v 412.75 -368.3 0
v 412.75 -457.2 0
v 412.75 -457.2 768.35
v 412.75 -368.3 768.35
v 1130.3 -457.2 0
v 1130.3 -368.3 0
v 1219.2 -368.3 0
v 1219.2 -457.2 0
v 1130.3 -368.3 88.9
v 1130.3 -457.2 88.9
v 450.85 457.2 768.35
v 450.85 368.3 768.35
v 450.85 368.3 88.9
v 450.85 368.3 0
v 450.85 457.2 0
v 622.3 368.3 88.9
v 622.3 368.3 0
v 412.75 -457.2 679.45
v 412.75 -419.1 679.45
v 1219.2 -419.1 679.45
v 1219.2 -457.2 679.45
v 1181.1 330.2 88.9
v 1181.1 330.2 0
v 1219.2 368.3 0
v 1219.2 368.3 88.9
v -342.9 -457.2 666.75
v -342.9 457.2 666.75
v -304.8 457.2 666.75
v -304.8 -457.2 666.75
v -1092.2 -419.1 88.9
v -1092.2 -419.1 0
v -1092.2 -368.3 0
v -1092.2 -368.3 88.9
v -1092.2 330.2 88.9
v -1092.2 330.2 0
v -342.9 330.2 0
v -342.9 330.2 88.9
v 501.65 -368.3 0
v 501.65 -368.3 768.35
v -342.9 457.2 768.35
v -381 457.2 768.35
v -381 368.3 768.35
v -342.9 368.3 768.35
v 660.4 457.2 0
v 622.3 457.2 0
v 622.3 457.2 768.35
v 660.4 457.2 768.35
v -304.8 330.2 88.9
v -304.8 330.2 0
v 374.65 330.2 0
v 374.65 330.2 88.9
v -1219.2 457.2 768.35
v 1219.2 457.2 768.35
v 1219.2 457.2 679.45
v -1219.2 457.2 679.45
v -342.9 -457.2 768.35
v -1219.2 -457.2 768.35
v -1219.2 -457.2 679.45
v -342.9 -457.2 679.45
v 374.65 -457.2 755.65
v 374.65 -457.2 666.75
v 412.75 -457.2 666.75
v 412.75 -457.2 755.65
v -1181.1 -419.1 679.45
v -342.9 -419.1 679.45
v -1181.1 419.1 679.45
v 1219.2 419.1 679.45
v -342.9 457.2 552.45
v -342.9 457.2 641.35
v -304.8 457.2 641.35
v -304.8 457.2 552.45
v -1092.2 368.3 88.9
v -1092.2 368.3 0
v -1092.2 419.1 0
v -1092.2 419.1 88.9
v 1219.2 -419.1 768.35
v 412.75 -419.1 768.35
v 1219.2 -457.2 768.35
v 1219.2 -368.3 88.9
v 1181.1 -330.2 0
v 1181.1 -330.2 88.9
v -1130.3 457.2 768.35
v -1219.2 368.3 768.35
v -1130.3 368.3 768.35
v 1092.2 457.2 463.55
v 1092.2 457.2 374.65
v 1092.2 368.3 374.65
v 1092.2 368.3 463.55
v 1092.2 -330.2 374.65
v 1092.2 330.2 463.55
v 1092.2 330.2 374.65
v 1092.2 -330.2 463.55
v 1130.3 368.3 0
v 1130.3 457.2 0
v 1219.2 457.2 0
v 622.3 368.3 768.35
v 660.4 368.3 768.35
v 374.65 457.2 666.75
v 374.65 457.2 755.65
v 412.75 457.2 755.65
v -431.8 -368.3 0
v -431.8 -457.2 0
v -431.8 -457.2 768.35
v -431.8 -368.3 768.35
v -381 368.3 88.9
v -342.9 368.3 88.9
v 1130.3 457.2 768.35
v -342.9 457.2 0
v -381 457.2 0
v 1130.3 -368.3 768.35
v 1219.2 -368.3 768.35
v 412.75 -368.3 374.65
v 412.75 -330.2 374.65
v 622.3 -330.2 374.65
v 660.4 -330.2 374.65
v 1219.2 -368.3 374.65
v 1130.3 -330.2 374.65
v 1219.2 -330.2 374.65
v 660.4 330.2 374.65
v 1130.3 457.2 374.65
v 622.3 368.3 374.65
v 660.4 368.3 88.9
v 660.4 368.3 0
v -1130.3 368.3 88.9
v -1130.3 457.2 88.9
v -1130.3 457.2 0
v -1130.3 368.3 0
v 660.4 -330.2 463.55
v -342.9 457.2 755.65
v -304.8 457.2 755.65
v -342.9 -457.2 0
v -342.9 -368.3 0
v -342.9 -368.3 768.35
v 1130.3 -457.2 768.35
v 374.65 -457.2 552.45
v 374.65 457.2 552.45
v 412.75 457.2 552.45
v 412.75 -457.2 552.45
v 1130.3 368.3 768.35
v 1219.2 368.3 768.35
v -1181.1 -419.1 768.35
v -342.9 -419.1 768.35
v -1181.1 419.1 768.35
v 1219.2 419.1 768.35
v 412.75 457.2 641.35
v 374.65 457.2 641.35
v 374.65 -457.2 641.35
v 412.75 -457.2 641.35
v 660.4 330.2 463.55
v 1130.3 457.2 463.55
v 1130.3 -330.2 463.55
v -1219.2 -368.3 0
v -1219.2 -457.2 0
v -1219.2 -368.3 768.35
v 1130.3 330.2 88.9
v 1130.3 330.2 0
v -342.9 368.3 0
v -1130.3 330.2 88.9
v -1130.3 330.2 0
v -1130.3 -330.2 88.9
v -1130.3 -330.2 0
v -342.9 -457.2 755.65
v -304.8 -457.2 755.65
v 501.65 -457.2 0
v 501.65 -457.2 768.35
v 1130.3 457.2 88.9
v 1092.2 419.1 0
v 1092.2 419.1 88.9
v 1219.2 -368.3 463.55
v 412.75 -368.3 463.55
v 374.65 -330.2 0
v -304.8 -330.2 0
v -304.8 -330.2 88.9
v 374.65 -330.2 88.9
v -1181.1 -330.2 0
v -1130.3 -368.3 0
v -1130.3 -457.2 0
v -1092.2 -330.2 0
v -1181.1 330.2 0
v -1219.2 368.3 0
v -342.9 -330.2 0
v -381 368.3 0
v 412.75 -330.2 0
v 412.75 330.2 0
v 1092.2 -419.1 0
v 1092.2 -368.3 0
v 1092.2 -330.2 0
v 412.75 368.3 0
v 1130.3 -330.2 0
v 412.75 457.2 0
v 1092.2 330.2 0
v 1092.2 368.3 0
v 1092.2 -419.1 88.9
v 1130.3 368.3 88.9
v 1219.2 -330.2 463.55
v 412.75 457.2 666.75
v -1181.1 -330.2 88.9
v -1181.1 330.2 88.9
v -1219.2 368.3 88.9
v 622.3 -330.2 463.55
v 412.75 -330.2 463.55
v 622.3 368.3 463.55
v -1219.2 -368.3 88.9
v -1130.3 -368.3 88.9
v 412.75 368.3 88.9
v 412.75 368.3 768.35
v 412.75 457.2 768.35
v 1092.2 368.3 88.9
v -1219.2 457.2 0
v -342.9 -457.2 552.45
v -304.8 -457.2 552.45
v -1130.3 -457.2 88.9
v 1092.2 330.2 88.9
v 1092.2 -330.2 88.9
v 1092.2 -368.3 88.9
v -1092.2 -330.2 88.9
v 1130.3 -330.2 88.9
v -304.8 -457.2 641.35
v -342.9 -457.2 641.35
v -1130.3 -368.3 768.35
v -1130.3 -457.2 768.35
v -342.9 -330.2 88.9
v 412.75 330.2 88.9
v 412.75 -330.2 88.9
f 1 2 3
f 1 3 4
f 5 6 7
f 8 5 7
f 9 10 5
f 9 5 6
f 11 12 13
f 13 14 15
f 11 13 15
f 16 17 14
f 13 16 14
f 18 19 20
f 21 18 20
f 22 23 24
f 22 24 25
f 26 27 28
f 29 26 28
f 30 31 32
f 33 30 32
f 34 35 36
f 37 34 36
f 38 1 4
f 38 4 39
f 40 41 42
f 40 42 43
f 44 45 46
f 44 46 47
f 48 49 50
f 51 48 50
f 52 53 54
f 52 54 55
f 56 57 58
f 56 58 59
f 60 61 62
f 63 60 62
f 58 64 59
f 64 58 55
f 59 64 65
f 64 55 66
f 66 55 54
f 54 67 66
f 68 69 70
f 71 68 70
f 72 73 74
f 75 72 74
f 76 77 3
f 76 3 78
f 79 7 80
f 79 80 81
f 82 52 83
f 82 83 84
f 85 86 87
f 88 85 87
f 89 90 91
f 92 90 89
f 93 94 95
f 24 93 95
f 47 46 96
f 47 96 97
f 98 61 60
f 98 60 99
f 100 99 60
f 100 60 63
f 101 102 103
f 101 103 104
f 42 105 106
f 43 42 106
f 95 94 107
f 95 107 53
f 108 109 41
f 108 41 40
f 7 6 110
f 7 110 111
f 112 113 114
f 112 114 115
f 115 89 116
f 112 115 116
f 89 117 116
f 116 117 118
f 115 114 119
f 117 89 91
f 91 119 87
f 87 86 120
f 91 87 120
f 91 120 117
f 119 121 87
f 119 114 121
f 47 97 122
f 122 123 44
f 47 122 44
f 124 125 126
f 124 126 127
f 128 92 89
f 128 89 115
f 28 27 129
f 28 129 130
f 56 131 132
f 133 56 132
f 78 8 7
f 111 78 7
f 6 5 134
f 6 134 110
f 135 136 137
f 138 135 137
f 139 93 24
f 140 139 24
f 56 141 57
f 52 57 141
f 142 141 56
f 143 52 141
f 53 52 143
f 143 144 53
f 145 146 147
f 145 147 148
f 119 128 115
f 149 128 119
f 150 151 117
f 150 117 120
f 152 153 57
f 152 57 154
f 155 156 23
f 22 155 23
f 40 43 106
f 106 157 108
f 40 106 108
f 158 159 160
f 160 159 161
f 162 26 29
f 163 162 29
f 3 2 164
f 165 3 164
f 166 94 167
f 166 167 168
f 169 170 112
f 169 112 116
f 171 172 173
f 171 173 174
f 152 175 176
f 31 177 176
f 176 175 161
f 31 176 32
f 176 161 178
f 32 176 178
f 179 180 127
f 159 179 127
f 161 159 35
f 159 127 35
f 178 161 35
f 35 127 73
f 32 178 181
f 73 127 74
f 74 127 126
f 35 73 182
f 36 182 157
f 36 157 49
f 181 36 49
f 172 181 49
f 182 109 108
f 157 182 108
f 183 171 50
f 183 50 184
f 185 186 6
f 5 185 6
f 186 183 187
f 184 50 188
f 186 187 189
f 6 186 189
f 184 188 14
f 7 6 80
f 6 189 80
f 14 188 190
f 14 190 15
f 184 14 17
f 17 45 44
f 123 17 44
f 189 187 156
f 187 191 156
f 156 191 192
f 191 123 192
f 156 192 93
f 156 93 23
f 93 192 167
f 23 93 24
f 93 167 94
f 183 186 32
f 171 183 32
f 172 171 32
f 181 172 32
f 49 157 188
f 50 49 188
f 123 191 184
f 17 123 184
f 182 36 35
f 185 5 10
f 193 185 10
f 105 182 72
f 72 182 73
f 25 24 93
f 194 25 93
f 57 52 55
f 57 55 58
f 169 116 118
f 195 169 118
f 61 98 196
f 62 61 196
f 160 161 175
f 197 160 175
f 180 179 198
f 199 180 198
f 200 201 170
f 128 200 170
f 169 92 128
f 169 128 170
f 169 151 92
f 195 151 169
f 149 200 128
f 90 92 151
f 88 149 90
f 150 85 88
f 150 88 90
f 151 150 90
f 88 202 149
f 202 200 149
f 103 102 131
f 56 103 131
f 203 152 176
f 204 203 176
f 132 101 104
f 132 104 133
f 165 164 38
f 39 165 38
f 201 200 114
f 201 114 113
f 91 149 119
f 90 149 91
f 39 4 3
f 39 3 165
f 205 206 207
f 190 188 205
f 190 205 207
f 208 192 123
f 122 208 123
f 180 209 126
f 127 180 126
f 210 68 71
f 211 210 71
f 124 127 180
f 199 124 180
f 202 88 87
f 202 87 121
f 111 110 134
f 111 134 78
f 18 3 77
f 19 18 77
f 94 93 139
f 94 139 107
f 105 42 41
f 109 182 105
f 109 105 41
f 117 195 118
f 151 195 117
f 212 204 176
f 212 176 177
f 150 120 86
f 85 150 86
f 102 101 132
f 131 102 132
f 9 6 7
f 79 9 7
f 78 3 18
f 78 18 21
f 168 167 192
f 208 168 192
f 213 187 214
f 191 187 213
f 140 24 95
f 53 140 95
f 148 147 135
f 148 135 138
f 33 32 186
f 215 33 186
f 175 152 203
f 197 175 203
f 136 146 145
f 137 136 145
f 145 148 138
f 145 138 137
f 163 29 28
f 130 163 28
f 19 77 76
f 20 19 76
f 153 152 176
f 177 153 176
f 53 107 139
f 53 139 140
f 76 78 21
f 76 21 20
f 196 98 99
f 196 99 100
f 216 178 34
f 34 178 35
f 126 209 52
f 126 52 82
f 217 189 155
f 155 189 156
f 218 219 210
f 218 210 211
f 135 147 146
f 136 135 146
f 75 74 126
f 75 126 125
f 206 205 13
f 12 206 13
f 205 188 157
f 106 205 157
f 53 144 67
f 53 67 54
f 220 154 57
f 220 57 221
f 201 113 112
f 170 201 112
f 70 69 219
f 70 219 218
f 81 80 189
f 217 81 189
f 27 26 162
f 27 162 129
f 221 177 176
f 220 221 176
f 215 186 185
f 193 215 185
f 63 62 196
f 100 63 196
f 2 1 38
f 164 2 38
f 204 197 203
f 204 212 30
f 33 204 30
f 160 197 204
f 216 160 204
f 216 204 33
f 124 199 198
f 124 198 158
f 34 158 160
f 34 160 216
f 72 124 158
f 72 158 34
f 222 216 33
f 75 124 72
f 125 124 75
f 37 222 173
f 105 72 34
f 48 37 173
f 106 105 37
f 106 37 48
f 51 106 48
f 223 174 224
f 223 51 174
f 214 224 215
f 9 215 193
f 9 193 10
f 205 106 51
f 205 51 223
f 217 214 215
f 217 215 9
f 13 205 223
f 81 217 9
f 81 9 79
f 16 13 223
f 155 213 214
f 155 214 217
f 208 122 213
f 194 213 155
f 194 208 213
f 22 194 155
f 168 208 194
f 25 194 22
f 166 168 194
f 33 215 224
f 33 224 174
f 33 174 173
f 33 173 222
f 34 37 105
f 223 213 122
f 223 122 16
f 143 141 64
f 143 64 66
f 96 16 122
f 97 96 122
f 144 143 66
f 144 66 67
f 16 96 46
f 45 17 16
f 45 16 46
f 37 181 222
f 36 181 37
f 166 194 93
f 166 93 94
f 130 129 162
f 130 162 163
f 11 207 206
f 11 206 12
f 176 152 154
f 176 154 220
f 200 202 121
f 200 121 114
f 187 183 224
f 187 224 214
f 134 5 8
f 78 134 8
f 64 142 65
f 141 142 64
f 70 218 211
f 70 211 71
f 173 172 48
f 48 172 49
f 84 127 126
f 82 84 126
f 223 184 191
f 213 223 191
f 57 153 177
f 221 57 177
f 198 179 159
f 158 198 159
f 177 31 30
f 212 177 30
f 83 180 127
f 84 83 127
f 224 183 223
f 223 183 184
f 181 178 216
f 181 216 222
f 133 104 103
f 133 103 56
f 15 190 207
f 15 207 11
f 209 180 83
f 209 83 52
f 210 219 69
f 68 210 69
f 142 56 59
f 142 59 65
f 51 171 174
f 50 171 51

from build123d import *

# Parameters (mm, degrees)
F0_W      = 88.9
F0_H      = 88.9
F1_DEPTH  = 768.35
F2_W      = 2184.4
F2_H      = 660.4
F3_DEPTH  = 88.9
F4_SIZE   = 38.09999
F5_W      = 38.1
F5_H      = 660.4
F6_DEPTH  = 88.9
F7_W      = 38.1
F7_H      = 88.9
F8_DEPTH  = 768.35
F13_W     = 38.1
F13_H     = 660.4
F14_DEPTH = 88.9
F15_W     = 38.1
F15_H     = 914.4
F16_DEPTH = 88.9
F17_W     = 38.1
F17_H     = 914.4
F18_DEPTH = 88.9
F19_DEPTH = 88.9
F12_W     = 806.45
F12_H     = 38.1


# Not quite as in the source:
# - a fillet or chamfer is up to 0.001 mm smaller than in the source, because OpenCascade refuses the exact size


with BuildPart() as f1:
    # F0 (on Top) → F1 (new body)
    with BuildSketch(Plane.XY):
        with Locations((-1174.75, -412.75)):
            Rectangle(F0_W, F0_H)
    extrude(amount=F1_DEPTH)


with BuildPart() as f1b:
    # F0 (on Top) → F1, piece 2 (new body)
    with BuildSketch(Plane.XY):
        with Locations((-1174.75, 412.75)):
            Rectangle(F0_W, F0_H)
    extrude(amount=F1_DEPTH)


with BuildPart() as f1c:
    # F0 (on Top) → F1, piece 3 (new body)
    with BuildSketch(Plane.XY):
        with Locations((1174.75, -412.75)):
            Rectangle(F0_W, F0_H)
    extrude(amount=F1_DEPTH)


with BuildPart() as f1d:
    # F0 (on Top) → F1, piece 4 (new body)
    with BuildSketch(Plane.XY):
        with Locations((1174.75, 412.75)):
            Rectangle(F0_W, F0_H)
    extrude(amount=F1_DEPTH)


with BuildPart() as f1e:
    # F0 (on Top) → F1, piece 5 (new body)
    with BuildSketch(Plane.XY):
        with Locations((-387.35, -412.75)):
            Rectangle(F0_W, F0_H)
    extrude(amount=F1_DEPTH)


with BuildPart() as f1f:
    # F0 (on Top) → F1, piece 6 (new body)
    with BuildSketch(Plane.XY):
        with Locations((457.2, -412.75)):
            Rectangle(F0_W, F0_H)
    extrude(amount=F1_DEPTH)


with BuildPart() as f3:
    # F2 (on Top) → F3 (new body)
    with BuildSketch(Plane.XY):
        Polygon((-1130.3, 368.3), (-1219.2, 368.3), (-1219.2, 330.2), (-1130.3, 330.2), (-1130.3, -330.2), (-1219.2, -330.2), (-1219.2, -368.3), (-1130.3, -368.3), (-1130.3, -457.2), (-1092.2, -457.2), (-1092.2, -368.3), (1092.2, -368.3), (1092.2, -457.2), (1130.3, -457.2), (1130.3, -368.3), (1219.2, -368.3), (1219.2, -330.2), (1130.3, -330.2), (1130.3, 330.2), (1219.2, 330.2), (1219.2, 368.3), (1130.3, 368.3), (1130.3, 457.2), (1092.2, 457.2), (1092.2, 368.3), (-1092.2, 368.3), (-1092.2, 457.2), (-1130.3, 457.2), align=None)
        Rectangle(F2_W, F2_H, mode=Mode.SUBTRACT)
    extrude(amount=F3_DEPTH)

    # F4 (size 38.1 in the source; OpenCascade refuses exactly that, so slightly less here)
    f4_edges = [f3.edges().sort_by_distance(p)[0] for p in [
        (-1219.2, 330.2, 44.45),
        (-1219.2, -330.2, 44.45),
        (-1092.2, -457.2, 44.45),
        (1092.2, -457.2, 44.45),
        (1219.2, 330.2, 44.45),
        (1092.2, 457.2, 44.45),
        (1219.2, -330.2, 44.45),
        (-1092.2, 457.2, 44.45),
    ]]
    chamfer(f4_edges, length=F4_SIZE)

    # F5 (on Top) → F6 (join, through all)
    with BuildSketch(Plane.XY):
        with Locations((-323.85, 0)):
            Rectangle(F5_W, F5_H)
        with Locations((393.7, 0)):
            Rectangle(F5_W, F5_H)
    extrude(amount=F6_DEPTH)

    # F7 (on Top) → F8 (join, through all)
    with BuildSketch(Plane.XY):
        with Locations((-361.95, 412.75)):
            Rectangle(F7_W, F7_H)
        with Locations((431.8, 412.75)):
            Rectangle(F7_W, F7_H)
        with Locations((641.35, 412.75)):
            Rectangle(F7_W, F7_H)
    extrude(amount=F8_DEPTH)


with BuildPart() as f14:
    # F13 (on offset) → F14 (new body)
    with BuildSketch(Plane.XY.offset(463.55)):
        Polygon((622.3, -330.2), (412.75, -330.2), (412.75, -368.3), (1219.2, -368.3), (1219.2, -330.2), (1130.3, -330.2), (1092.2, -330.2), (660.4, -330.2), align=None)
        with Locations((641.35, 0)):
            Rectangle(F13_W, F13_H)
        Polygon((622.3, 368.3), (622.3, 330.2), (660.4, 330.2), (1092.2, 330.2), (1092.2, 368.3), align=None)
        Polygon((1092.2, 330.2), (1092.2, -330.2), (1130.3, -330.2), (1130.3, 457.2), (1092.2, 457.2), (1092.2, 368.3), align=None)
    extrude(amount=-F14_DEPTH)


with BuildPart() as f16:
    # F15 (on offset) → F16 (new body)
    with BuildSketch(Plane.XY.offset(641.35)):
        with Locations((-323.85, 0)):
            Rectangle(F15_W, F15_H)
    extrude(amount=-F16_DEPTH)


with BuildPart() as f16b:
    # F15 (on offset) → F16, piece 2 (new body)
    with BuildSketch(Plane.XY.offset(641.35)):
        with Locations((393.7, 0)):
            Rectangle(F15_W, F15_H)
    extrude(amount=-F16_DEPTH)


with BuildPart() as f18:
    # F17 (on offset) → F18 (new body)
    with BuildSketch(Plane.XY.offset(666.75)):
        with Locations((-323.85, 0)):
            Rectangle(F17_W, F17_H)
    extrude(amount=F18_DEPTH)


with BuildPart() as f18b:
    # F17 (on offset) → F18, piece 2 (new body)
    with BuildSketch(Plane.XY.offset(666.75)):
        with Locations((393.7, 0)):
            Rectangle(F17_W, F17_H)
    extrude(amount=F18_DEPTH)


with BuildPart() as f19:
    # F12 (on face) → F19 (new body)
    with BuildSketch(Plane.XY.offset(768.35)):
        Polygon((1219.2, 457.2), (-1219.2, 457.2), (-1219.2, 419.1), (-1219.2, -457.2), (-1181.1, -457.2), (-342.9, -457.2), (-342.9, -419.1), (-1181.1, -419.1), (-1181.1, 419.1), (1219.2, 419.1), align=None)
    extrude(amount=-F19_DEPTH)


with BuildPart() as f19b:
    # F12 (on face) → F19, piece 2 (new body)
    with BuildSketch(Plane.XY.offset(768.35)):
        with Locations((815.975, -438.15)):
            Rectangle(F12_W, F12_H)
    extrude(amount=-F19_DEPTH)


solid = Compound([f1.part, f1b.part, f1c.part, f1d.part, f1e.part, f1f.part, f3.part, f14.part, f16.part, f16b.part, f18.part, f18b.part, f19.part, f19b.part])
